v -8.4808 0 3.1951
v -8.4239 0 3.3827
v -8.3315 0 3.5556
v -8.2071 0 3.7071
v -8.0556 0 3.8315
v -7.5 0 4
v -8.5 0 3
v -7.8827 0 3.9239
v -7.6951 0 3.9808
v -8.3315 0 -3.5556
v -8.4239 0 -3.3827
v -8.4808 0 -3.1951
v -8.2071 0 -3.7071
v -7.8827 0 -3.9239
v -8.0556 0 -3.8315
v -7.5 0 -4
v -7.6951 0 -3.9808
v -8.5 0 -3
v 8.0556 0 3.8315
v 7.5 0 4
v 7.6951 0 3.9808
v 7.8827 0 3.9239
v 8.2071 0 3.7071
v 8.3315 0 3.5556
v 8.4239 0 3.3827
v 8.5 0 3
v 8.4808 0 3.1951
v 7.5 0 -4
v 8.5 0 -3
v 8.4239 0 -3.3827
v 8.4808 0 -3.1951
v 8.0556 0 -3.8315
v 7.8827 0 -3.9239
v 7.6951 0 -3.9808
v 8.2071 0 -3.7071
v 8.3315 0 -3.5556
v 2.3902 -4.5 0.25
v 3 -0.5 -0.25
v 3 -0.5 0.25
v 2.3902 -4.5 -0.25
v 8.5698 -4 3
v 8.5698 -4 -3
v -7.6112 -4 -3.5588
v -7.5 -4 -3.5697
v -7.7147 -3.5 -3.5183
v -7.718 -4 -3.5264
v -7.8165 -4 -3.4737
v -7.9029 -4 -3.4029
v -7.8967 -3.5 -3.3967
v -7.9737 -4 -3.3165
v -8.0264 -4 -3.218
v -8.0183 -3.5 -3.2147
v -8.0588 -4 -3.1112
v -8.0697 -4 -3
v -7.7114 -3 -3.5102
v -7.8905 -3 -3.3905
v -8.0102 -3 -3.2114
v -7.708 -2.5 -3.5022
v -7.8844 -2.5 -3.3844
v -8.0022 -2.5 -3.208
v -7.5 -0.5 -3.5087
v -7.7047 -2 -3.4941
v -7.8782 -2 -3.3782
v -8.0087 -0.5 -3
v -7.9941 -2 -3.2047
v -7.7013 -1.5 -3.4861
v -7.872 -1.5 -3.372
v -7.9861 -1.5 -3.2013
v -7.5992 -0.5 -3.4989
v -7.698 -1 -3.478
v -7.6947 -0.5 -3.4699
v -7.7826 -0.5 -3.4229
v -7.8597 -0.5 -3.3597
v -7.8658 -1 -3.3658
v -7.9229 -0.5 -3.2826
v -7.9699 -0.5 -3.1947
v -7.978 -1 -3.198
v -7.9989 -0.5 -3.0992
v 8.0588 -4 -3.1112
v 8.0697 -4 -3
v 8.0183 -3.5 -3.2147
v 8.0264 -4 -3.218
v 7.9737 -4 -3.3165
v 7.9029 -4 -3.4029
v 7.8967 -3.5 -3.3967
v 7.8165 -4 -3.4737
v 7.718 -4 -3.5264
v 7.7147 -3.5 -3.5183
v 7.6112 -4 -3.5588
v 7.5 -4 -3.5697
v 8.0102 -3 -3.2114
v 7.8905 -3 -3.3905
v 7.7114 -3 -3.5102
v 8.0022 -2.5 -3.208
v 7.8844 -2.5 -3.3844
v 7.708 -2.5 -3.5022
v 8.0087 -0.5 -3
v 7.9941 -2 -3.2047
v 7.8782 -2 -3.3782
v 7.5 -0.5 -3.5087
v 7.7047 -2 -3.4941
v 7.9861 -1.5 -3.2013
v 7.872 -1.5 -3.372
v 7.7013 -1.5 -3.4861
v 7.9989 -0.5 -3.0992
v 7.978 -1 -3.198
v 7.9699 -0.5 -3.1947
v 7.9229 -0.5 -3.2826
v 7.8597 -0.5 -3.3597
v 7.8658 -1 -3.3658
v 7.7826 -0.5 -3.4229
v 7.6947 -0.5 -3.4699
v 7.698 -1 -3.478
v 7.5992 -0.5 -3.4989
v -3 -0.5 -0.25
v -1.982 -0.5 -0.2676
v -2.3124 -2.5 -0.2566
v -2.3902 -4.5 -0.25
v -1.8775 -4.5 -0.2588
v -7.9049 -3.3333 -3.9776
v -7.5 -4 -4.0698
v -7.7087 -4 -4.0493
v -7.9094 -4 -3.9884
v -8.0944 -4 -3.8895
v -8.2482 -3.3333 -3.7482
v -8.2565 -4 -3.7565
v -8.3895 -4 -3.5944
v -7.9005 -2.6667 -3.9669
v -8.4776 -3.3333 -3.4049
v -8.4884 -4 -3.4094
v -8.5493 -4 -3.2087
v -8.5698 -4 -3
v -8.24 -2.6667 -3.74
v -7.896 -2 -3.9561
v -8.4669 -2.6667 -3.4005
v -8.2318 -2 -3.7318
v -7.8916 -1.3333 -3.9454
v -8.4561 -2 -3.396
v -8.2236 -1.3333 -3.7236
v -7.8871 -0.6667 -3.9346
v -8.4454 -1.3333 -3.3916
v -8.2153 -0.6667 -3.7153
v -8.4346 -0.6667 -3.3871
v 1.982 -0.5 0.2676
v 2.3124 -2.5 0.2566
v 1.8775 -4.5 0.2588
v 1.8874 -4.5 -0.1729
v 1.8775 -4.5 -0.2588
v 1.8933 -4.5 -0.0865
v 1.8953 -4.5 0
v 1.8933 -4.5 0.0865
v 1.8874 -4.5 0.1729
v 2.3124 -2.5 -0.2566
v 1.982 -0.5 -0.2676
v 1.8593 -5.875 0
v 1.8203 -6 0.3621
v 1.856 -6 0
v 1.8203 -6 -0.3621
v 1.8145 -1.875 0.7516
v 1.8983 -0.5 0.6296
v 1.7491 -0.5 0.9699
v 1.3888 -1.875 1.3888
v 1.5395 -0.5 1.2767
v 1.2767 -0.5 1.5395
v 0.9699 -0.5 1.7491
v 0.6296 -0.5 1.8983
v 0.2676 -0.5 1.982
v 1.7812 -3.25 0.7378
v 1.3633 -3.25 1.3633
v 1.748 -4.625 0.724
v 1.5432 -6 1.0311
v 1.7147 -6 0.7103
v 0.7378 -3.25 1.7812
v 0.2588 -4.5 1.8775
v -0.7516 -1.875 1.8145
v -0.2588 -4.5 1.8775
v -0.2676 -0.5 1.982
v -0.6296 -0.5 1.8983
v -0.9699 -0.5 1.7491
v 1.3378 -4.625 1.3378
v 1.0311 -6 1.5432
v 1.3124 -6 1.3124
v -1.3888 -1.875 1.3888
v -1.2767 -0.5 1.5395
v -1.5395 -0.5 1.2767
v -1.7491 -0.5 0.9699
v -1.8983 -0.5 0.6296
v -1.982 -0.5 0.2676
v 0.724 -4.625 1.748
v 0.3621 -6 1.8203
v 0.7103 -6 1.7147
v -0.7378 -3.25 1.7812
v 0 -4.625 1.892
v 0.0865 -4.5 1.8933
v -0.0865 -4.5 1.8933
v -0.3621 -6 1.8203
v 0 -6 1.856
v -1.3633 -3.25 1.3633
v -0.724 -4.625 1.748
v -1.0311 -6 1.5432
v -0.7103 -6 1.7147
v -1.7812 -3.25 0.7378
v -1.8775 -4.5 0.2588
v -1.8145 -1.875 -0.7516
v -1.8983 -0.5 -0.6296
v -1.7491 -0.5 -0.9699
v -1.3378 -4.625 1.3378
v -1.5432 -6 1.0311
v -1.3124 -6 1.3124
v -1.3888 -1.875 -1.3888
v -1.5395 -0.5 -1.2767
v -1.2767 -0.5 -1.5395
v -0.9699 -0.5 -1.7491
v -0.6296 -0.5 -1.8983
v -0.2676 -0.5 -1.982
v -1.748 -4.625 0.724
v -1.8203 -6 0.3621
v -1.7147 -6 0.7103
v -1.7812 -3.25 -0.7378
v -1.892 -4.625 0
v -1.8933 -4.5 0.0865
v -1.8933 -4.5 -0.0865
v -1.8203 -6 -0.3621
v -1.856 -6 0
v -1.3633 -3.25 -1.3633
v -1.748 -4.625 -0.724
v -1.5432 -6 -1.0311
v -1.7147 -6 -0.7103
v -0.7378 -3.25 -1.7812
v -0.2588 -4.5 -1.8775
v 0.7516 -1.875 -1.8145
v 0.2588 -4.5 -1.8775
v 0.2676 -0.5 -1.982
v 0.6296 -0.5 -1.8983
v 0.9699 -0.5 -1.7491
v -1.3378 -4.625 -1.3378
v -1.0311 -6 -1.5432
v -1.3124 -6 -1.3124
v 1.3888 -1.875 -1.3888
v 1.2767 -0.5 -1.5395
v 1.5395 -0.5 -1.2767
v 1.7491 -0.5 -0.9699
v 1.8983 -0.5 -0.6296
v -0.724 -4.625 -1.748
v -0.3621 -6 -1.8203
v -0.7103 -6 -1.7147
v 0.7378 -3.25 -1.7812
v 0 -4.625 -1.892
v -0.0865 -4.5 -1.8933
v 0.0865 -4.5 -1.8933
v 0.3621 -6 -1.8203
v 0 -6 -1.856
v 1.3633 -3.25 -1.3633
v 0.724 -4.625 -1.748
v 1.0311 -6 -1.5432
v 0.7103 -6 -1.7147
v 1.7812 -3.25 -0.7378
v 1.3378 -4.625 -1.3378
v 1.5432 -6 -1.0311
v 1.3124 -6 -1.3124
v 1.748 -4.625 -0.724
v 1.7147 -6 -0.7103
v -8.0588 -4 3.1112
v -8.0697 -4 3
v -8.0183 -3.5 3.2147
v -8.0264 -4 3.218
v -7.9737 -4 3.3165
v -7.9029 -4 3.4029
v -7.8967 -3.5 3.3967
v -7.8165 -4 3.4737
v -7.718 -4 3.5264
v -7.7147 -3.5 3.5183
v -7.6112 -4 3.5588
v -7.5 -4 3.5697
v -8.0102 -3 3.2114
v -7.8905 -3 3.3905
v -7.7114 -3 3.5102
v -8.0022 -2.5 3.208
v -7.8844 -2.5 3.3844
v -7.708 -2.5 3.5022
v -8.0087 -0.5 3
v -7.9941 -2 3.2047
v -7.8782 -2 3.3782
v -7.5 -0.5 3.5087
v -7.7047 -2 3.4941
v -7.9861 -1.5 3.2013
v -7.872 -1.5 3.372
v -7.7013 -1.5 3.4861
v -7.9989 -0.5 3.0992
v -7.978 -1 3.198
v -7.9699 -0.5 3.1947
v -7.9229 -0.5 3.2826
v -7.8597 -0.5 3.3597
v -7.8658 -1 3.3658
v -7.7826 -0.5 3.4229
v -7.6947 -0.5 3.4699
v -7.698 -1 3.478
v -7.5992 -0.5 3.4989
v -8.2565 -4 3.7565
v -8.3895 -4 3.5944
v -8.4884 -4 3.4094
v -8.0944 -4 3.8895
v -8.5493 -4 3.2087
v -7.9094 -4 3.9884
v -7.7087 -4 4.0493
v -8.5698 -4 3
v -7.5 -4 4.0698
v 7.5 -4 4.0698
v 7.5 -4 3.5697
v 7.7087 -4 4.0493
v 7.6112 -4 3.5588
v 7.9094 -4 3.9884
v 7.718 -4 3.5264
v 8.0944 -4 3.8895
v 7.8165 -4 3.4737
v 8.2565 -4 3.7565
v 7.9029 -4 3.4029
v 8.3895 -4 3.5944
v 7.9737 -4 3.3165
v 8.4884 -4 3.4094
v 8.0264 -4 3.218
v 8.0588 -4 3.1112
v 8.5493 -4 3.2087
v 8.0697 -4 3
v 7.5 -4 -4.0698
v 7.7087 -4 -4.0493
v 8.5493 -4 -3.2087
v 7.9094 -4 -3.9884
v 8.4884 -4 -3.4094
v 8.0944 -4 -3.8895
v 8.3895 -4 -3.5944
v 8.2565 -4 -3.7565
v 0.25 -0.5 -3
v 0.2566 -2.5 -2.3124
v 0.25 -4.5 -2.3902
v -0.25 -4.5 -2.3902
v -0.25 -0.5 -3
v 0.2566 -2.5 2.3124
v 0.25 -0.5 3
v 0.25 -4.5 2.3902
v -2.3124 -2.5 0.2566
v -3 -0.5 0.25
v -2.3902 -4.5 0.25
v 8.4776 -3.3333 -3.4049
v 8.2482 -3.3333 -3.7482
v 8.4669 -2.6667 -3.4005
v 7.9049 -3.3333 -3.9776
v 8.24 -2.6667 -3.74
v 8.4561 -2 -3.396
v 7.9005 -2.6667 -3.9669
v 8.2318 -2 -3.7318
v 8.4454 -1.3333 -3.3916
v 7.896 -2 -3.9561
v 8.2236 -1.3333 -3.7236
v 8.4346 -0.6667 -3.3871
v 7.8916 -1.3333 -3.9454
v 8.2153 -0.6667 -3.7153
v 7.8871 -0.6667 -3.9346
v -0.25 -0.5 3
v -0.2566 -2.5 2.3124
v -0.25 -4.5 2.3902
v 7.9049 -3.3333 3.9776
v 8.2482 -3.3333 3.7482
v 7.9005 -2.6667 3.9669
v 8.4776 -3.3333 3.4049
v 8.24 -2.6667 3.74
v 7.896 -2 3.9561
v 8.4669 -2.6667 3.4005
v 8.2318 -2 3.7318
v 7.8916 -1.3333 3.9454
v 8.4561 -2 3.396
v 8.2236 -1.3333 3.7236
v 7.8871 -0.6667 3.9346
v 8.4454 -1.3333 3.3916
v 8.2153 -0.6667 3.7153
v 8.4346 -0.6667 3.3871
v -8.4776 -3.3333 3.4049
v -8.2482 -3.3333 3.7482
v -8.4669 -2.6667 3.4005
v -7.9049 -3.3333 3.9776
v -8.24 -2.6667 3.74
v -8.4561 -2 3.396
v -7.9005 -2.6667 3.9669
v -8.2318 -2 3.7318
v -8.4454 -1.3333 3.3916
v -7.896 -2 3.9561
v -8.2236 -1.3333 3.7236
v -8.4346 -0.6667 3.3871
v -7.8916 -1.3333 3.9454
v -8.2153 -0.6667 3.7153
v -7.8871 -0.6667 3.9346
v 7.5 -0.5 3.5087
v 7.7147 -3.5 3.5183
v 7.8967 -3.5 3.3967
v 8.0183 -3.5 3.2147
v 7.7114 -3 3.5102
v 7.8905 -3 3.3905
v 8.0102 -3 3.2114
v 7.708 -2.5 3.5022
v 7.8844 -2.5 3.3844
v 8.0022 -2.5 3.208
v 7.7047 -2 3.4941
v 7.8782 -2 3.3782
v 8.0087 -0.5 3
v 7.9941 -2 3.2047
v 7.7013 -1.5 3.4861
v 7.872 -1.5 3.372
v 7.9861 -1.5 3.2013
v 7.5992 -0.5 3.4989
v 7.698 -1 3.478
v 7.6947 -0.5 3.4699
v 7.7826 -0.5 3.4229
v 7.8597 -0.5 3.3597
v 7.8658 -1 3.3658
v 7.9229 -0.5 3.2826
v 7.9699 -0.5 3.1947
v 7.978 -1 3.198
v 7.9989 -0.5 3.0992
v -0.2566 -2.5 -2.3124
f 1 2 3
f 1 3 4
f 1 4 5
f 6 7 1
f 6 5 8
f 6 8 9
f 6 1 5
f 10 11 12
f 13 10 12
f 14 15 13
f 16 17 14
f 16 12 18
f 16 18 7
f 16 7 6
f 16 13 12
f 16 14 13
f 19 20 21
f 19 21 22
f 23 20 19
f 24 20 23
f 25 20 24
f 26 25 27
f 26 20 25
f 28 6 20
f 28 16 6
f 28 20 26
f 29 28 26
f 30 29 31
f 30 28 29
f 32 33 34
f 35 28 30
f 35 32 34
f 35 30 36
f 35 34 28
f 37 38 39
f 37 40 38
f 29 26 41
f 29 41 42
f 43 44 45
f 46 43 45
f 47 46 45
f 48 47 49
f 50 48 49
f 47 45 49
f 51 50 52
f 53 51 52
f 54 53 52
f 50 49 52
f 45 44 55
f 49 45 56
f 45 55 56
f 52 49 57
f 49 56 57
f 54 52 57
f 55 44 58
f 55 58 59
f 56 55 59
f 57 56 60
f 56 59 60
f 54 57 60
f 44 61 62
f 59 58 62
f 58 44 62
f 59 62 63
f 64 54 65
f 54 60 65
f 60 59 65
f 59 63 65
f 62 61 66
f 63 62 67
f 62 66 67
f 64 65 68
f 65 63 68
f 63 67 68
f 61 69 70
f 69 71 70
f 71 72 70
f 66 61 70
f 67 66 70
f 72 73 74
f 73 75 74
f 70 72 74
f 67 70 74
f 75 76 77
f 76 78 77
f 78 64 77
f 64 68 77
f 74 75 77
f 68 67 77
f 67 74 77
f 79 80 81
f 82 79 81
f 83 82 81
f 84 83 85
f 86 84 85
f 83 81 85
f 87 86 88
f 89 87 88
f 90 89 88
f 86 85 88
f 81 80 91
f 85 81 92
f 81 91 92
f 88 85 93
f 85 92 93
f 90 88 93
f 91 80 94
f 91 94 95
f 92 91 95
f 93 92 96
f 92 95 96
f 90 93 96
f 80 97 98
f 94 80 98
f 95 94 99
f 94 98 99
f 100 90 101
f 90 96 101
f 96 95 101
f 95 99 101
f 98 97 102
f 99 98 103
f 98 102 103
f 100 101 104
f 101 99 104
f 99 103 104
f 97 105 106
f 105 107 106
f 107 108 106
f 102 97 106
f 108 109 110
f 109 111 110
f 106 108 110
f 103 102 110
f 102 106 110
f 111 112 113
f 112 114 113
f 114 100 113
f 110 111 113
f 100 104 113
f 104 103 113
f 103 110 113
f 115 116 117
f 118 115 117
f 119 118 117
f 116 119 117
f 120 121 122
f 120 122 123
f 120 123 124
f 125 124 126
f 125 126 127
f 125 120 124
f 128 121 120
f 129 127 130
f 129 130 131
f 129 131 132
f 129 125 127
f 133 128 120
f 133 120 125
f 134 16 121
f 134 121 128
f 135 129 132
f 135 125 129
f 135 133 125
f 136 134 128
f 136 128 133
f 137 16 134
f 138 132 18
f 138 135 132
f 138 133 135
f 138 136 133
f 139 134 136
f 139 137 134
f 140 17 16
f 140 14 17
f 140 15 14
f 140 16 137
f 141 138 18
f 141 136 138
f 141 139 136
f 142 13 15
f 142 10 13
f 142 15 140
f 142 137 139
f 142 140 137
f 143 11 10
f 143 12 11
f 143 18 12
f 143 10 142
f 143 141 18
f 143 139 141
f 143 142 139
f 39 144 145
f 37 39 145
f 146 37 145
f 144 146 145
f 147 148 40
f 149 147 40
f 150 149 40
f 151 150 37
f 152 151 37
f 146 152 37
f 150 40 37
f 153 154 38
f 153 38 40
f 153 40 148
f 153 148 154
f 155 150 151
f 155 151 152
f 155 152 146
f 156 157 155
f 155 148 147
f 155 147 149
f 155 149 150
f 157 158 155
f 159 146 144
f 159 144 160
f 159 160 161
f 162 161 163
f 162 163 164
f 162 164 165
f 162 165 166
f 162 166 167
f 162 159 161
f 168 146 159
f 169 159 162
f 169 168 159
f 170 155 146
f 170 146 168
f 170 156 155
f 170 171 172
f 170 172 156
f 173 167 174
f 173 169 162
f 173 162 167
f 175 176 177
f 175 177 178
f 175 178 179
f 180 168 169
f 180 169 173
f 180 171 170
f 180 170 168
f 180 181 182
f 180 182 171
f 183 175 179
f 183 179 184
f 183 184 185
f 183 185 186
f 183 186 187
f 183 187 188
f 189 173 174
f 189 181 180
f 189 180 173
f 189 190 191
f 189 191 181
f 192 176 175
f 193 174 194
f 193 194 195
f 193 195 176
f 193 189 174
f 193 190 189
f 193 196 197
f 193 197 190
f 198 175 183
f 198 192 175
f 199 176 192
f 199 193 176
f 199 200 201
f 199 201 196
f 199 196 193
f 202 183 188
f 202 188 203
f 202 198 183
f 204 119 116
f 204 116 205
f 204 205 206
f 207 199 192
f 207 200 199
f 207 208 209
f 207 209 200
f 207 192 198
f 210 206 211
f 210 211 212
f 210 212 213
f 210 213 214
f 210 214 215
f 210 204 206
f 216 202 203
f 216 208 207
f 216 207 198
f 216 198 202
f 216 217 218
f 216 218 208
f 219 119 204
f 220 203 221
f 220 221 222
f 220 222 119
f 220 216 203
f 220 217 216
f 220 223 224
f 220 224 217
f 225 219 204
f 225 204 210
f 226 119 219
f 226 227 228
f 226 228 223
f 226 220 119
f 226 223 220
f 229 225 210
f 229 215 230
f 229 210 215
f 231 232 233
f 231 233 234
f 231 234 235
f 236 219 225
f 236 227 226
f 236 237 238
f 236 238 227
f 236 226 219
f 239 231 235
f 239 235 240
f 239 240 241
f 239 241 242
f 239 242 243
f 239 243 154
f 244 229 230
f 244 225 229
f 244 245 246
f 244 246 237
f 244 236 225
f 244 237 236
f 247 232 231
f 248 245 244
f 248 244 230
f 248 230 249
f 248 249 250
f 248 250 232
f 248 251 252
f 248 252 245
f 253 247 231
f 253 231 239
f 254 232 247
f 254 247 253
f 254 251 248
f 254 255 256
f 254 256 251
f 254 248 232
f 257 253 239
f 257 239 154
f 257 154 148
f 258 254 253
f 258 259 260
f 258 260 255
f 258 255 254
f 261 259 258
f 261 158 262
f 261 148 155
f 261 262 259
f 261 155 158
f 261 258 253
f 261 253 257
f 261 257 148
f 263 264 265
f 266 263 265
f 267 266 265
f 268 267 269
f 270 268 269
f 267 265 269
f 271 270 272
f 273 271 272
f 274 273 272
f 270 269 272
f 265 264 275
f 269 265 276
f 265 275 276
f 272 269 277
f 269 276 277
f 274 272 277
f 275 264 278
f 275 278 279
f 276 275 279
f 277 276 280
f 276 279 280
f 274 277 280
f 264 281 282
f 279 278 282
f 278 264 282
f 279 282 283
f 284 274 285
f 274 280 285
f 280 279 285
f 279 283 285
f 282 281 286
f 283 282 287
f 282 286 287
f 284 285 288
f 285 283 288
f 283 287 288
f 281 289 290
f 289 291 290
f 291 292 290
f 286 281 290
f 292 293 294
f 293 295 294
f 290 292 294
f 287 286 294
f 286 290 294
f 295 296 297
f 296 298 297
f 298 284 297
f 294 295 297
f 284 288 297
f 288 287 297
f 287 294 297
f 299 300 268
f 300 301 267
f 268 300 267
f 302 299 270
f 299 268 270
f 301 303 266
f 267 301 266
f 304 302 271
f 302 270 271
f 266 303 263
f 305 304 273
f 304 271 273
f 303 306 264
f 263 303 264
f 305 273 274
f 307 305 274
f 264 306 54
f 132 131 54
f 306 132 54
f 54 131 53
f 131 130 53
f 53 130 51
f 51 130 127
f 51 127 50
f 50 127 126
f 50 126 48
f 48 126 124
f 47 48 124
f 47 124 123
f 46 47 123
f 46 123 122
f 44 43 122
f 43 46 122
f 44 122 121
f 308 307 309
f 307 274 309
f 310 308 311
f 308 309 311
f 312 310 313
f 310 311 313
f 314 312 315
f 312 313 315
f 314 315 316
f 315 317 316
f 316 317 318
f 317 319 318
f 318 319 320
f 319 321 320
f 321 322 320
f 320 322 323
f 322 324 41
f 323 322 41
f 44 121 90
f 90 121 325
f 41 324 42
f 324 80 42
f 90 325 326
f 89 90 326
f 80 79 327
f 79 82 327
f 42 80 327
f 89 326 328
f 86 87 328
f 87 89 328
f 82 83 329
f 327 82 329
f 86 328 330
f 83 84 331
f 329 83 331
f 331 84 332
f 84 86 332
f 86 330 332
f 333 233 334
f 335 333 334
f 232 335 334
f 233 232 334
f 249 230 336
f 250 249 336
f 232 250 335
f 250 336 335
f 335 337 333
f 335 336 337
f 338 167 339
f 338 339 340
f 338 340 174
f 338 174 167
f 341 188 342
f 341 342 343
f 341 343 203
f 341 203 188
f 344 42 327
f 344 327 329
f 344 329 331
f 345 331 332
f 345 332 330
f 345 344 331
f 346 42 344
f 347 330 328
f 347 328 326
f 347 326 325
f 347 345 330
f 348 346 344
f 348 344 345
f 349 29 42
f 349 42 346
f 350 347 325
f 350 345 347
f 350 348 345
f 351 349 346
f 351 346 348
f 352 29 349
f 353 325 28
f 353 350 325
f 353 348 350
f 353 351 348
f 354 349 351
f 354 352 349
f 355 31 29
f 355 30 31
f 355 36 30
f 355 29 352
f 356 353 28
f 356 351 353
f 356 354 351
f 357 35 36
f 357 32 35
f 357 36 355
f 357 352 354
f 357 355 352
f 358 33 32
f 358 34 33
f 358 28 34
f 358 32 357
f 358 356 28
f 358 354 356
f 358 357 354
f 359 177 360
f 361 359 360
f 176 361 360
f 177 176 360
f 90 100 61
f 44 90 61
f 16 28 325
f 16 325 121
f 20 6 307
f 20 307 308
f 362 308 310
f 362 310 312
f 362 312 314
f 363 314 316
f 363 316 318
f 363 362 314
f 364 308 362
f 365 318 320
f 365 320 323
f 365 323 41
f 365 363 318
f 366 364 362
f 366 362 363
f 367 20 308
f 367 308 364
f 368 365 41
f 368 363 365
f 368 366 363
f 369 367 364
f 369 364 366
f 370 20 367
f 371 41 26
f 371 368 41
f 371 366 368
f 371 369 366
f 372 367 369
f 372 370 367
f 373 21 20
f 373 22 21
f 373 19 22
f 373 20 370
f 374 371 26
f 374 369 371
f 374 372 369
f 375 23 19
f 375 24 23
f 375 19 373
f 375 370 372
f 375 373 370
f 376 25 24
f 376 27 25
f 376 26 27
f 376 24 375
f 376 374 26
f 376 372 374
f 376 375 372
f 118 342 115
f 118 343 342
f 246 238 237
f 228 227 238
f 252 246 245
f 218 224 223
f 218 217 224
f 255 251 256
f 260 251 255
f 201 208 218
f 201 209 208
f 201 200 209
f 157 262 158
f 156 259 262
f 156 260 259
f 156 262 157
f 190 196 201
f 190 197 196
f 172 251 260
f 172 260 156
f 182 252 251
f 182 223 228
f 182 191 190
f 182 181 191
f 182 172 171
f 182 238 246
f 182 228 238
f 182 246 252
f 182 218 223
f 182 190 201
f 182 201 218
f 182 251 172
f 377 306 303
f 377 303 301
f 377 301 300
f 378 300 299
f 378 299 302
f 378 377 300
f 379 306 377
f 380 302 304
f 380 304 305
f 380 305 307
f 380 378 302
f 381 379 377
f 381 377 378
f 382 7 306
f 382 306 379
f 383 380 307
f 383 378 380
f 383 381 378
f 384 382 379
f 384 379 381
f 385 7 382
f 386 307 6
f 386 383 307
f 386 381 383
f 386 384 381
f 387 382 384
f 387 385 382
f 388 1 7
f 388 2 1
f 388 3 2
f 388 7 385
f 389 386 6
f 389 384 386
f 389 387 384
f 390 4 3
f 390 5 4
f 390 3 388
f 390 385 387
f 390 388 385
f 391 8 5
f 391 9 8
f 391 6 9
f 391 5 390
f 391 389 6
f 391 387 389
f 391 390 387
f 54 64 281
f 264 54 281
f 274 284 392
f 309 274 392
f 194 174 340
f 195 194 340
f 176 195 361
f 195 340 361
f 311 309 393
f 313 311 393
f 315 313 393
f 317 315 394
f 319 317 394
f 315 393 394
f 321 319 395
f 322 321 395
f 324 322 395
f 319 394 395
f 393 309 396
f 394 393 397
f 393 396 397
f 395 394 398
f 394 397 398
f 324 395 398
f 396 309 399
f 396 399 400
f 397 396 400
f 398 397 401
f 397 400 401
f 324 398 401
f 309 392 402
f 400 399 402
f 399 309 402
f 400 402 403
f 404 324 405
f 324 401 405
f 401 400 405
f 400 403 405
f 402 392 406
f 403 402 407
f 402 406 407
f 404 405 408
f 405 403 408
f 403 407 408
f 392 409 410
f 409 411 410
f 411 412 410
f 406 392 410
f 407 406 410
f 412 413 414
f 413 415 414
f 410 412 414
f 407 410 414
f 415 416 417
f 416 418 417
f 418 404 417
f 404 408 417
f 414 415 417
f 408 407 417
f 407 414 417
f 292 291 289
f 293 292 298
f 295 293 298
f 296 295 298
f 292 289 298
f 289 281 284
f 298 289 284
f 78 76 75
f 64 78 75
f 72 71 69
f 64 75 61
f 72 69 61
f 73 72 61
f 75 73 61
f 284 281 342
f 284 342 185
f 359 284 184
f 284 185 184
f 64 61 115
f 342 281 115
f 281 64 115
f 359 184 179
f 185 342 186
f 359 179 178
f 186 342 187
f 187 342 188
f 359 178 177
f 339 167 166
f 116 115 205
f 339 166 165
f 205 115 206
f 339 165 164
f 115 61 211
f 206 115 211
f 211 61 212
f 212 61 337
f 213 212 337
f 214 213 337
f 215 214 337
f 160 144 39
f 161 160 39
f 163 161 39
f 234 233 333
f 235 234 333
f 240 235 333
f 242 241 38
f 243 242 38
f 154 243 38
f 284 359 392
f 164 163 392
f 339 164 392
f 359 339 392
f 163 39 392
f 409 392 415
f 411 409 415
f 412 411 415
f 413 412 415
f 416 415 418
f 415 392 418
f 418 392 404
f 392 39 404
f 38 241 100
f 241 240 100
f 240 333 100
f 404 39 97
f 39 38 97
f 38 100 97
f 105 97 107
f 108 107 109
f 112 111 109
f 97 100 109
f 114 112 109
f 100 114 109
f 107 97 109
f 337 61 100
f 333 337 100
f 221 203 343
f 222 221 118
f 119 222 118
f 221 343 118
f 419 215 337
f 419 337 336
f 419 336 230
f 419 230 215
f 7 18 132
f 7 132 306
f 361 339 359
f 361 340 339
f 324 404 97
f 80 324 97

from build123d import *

# Parameters (mm, degrees)
BOSS_EXTRUDE1_DEPTH = 4
BOSS_EXTRUDE1_DRAFT = 1
SHELL1_T            = -0.5
SKETCH2_R           = 2
BOSS_EXTRUDE2_DEPTH = 5.5
BOSS_EXTRUDE2_TAPER = 1.5
CIRPATTERN1_COUNT   = 4


with BuildPart() as part:
    # Sketch1 → Boss-Extrude1 (with draft: the straight prism first)
    with BuildSketch(Plane(origin=(0, 0, 0), x_dir=(1, 0, 0), z_dir=(0, 1, 0))):
        with BuildLine():
            Line((-7.5, -4), (7.5, -4))
            ThreePointArc((7.5, -4), (8.207106781, -3.707106781), (8.5, -3))
            Line((8.5, -3), (8.5, 3))
            ThreePointArc((8.5, 3), (8.207106781, 3.707106781), (7.5, 4))
            Line((7.5, 4), (-7.5, 4))
            ThreePointArc((-7.5, 4), (-8.207106781, 3.707106781), (-8.5, 3))
            Line((-8.5, 3), (-8.5, -3))
            ThreePointArc((-8.5, -3), (-8.207106781, -3.707106781), (-7.5, -4))
        make_face()
    extrude(amount=-BOSS_EXTRUDE1_DEPTH)
    # Boss-Extrude1: the draft: its side faces are tilted about the plane it starts from
    boss_extrude1_sides = [part.faces().sort_by_distance(p)[0] for p in [
        (0, -2, 4),
        (8.207106781, -2, 3.707106781),
        (8.5, -2, 0),
        (8.207106781, -2, -3.707106781),
        (0, -2, -4),
        (-8.207106781, -2, -3.707106781),
        (-8.5, -2, 0),
        (-8.207106781, -2, 3.707106781),
    ]]
    draft(boss_extrude1_sides, Plane(origin=(0, 0, 0), x_dir=(1, 0, 0), z_dir=(0, 1, 0)), BOSS_EXTRUDE1_DRAFT)

    # Shell1
    shell1_openings = [part.faces().sort_by_distance(p)[0] for p in [
        (0, -4, 0),
    ]]
    offset(amount=SHELL1_T, openings=shell1_openings, kind=Kind.INTERSECTION)

    # Sketch2 → Boss-Extrude2 (add)
    with BuildSketch(Plane.XZ.offset(0.5)):
        Circle(SKETCH2_R)
    extrude(amount=BOSS_EXTRUDE2_DEPTH, taper=BOSS_EXTRUDE2_TAPER)

    # Rib1: read off the stored shape, not the designer's step
    # Rib1: loft between two sections, ruled curve by curve
    rib1_from = [
        Edge.make_line((1.982021306, -0.5, 0.267565961), (3, -0.5, 0.25)),
        Edge.make_line((1.982021306, -0.5, -0.267565961), (3, -0.5, -0.25)),
        Edge.make_line((3, -0.5, -0.25), (3, -0.5, 0.25)),
        Edge.make_line((1.982021306, -0.5, -0.267565961), (1.982021306, -0.5, 0.267565961)),
    ]
    rib1_to = [
        Edge.make_line((1.877496814, -4.5, 0.25884785), (2.390245469, -4.5, 0.25)),
        Edge.make_line((1.877496814, -4.5, -0.25884785), (2.390245469, -4.5, -0.25)),
        Edge.make_line((2.390245469, -4.5, -0.25), (2.390245469, -4.5, 0.25)),
        Edge.make_line((1.877496814, -4.5, -0.25884785), (1.877496814, -4.5, 0.25884785)),
    ]
    rib1 = Solid(Shell([*[Face.make_surface_from_curves(rib1_from[k], rib1_to[k]) for k in range(4)], Face(Wire(rib1_from)), Face(Wire(rib1_to))]))
    add(rib1)

    # CirPattern1: Rib1 ×4 about axis
    cirpattern1_axis = Axis((0, 0, 0), (0, 1, 0))
    for i in range(1, CIRPATTERN1_COUNT):
        add(rib1.rotate(cirpattern1_axis, i * 360 / CIRPATTERN1_COUNT))


solid = part.part
